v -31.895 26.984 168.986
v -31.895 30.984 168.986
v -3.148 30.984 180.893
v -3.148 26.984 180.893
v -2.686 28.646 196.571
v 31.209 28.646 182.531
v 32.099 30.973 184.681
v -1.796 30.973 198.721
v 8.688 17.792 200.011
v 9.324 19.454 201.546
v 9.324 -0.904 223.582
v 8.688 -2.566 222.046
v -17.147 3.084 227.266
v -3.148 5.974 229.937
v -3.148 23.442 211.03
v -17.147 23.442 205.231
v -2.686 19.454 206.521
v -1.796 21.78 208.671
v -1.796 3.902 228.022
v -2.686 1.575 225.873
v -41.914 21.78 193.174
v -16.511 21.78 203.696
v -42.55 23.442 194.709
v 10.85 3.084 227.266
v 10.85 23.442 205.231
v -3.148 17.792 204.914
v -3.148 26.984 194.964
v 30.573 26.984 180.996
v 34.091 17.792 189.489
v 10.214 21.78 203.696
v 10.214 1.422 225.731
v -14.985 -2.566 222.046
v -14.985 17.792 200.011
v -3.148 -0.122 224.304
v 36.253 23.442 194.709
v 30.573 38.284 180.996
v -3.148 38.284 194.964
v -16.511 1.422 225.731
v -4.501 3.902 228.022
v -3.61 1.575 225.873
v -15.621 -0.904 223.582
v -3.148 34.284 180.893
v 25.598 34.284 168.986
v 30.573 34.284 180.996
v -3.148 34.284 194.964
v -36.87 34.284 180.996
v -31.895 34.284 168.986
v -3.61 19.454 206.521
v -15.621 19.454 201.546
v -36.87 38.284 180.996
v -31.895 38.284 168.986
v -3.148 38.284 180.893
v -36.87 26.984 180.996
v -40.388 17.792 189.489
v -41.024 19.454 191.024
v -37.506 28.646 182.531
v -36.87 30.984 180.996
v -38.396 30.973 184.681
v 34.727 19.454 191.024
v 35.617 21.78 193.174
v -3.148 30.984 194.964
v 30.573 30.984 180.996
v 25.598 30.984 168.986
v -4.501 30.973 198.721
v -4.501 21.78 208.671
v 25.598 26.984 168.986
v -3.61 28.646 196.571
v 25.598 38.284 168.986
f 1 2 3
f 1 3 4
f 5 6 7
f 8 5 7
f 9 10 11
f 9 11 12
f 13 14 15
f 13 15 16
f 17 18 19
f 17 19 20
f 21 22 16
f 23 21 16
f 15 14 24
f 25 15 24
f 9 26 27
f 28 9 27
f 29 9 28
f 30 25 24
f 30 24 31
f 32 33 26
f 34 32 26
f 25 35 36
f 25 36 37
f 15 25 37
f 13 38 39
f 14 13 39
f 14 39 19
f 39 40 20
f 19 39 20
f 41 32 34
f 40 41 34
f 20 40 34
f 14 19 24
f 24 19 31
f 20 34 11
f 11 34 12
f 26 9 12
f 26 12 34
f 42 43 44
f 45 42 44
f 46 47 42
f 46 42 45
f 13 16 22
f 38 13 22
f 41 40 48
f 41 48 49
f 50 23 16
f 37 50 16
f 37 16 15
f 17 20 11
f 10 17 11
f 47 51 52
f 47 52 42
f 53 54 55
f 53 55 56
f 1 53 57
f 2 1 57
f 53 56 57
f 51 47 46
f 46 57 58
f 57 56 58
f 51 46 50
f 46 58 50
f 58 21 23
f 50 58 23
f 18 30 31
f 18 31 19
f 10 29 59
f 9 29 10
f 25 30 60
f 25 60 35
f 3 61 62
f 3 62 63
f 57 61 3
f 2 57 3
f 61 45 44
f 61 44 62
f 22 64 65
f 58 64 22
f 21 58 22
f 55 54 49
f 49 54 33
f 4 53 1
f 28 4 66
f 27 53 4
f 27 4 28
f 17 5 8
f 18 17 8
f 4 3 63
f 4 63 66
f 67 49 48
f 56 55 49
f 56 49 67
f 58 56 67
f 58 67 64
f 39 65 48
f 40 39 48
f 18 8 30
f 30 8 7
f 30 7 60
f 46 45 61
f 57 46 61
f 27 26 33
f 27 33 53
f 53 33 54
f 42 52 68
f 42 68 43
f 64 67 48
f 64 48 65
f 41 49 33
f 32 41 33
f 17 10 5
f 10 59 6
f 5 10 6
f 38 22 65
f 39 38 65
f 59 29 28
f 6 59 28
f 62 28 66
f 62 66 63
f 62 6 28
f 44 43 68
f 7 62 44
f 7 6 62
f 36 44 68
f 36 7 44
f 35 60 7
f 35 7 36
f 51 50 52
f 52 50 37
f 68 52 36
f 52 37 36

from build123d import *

# Parameters (mm, degrees)
SKETCH1_W                = 214.089522673
SKETCH1_H                = 271.033566845
BOSS_EXTRUDE1_DEPTH      = 10
SKETCH3_W                = 107.044761337
SKETCH3_H                = 271.033566845
CUT_EXTRUDE1_DEPTH       = 252.253590179
CUT_EXTRUDE2_DEPTH       = 249.55642867
BOSS_EXTRUDE3_DEPTH      = 40
CUT_EXTRUDE3_START       = -165.689856025
CUT_EXTRUDE3_DEPTH       = 205.862728092
CUT_EXTRUDE4_DEPTH       = 250.960593361
CUT_EXTRUDE5_DEPTH       = 250.960593361
CUT_EXTRUDE11_DEPTH      = 252.67545035
SKETCH26_W               = 104.148686
SKETCH26_H               = 11.3
BOSS_EXTRUDE7_DEPTH      = 45
CUT_EXTRUDE12_DEPTH      = 250.816831154
CUT_EXTRUDE13_DEPTH      = 252.67545035
CUT_EXTRUDE14_DEPTH      = 237.436663672
BOSS_EXTRUDE8_DEPTH      = 13.546139965
BOSS_EXTRUDE9_DEPTH      = 30
CUT_EXTRUDE16_DEPTH      = 184.540545695
CUT_EXTRUDE17_DEPTH      = 30
CUT_EXTRUDE17_DEPTH_BACK = 30


with BuildPart() as part:
    # Sketch1 → Boss-Extrude1 (new body)
    with BuildSketch(Plane(origin=(0, 0, 0), x_dir=(1, 0, 0), z_dir=(0, 1, 0))):
        with Locations((-3.148375333, -90.062114546)):
            Rectangle(SKETCH1_W, SKETCH1_H)
    extrude(amount=BOSS_EXTRUDE1_DEPTH)

    # Sketch3 → Cut-Extrude1 (cut, through all)
    with BuildSketch(Plane(origin=(0, 10, 0), x_dir=(1, 0, 0), z_dir=(0, 1, 0))):
        with Locations((-56.670756002, -90.062114546)):
            Rectangle(SKETCH3_W, SKETCH3_H)
    extrude(amount=-CUT_EXTRUDE1_DEPTH, mode=Mode.SUBTRACT)

    # Sketch4 → Cut-Extrude2 (cut, through all)
    with BuildSketch(Plane(origin=(0, 10, 0), x_dir=(1, 0, 0), z_dir=(0, 1, 0))):
        Polygon((103.896386003, -181.239506042), (100.834918545, -173.848469781), (9.996584241, 45.454668877), (103.896386003, 45.454668877), align=None)
    extrude(amount=-CUT_EXTRUDE2_DEPTH, mode=Mode.SUBTRACT)

    # Sketch6 → Boss-Extrude3 (add, along a direction that is not the sketch's normal)
    with BuildSketch(Plane(origin=(0, 10, 0), x_dir=(1, 0, 0), z_dir=(0, 1, 0))):
        Polygon((99.572063218, -170.799667324), (103.896386003, -181.239506042), (-3.148375333, -225.578897968), (-3.148375333, -213.347866105), align=None)
    extrude(amount=BOSS_EXTRUDE3_DEPTH, dir=(-0.2705980500730979, 0.7071067811865489, -0.6532814824381872))

    # Cut-Extrude3: read off the stored shape, not the designer's step
    # Cut-Extrude3 outline → Cut-Extrude3 (cut)
    with BuildSketch(Plane(origin=(0, 0, 0), x_dir=(1, 0, 0), z_dir=(0, 0.6785983445458481, -0.7345095552677544)).offset(CUT_EXTRUDE3_START)):
        Polygon((-3.148375333, -165), (-3.148375333, -152.122604304), (-13.972297336, -155.165042499), (-15, -155.45391393), (-15, -165), align=None)
    extrude(amount=CUT_EXTRUDE3_DEPTH, mode=Mode.SUBTRACT)

    # Sketch8 → Cut-Extrude4 (cut, through all)
    with BuildSketch(Plane(origin=(0, 10, 0), x_dir=(1, 0, 0), z_dir=(0, 1, 0))):
        Polygon((-3.148375333, -225.578897968), (103.896386003, -181.239506042), (103.896386003, -225.578897968), align=None)
    extrude(amount=-CUT_EXTRUDE4_DEPTH, mode=Mode.SUBTRACT)

    # Sketch9 → Cut-Extrude5 (cut, through all)
    with BuildSketch(Plane(origin=(0, 10, 0), x_dir=(1, 0, 0), z_dir=(0, 1, 0))):
        Polygon((-3.148375333, -213.347866105), (99.572063218, -170.799667324), (9.996584241, 45.454668877), (-3.148375333, 45.454668877), align=None)
    extrude(amount=-CUT_EXTRUDE5_DEPTH, mode=Mode.SUBTRACT)

    # Sketch25 → Cut-Extrude11 (cut, through all)
    with BuildSketch(Plane(origin=(24.603270673, 0, -10.191008392), x_dir=(-0.38268343236508967, 0, -0.9238795325112868), z_dir=(0.9238795325112867, 0, -0.3826834323650896))):
        Polygon((-178.918624473, 38.284271247), (-178.918624473, 26.984271247), (-167.618624473, 38.284271247), align=None)
    extrude(amount=-CUT_EXTRUDE11_DEPTH, mode=Mode.SUBTRACT)

    # Sketch26 → Boss-Extrude7 (add)
    with BuildSketch(Plane(origin=(68.469193327, 0, 165.299255136), x_dir=(-0.9238795325112868, 0, 0.3826834323650896), z_dir=(-0.38268343236508956, 0, -0.9238795325112867))):
        with Locations((25.443954722, 32.634271247)):
            Rectangle(SKETCH26_W, SKETCH26_H)
    extrude(amount=BOSS_EXTRUDE7_DEPTH)

    # Sketch27 → Cut-Extrude12 (cut, through all)
    with BuildSketch(Plane.XZ.offset(-26.984271247)):
        Polygon((-3.148375333, 194.964223379), (-3.148375333, 146.256574366), (-20.36912979, 153.389644416), align=None)
    extrude(amount=-CUT_EXTRUDE12_DEPTH, mode=Mode.SUBTRACT)

    # Sketch29 → Cut-Extrude13 (cut, through all)
    with BuildSketch(Plane(origin=(24.603270673, 0, -10.191008392), x_dir=(-0.38268343236508967, 0, -0.9238795325112868), z_dir=(0.9238795325112867, 0, -0.3826834323650896))):
        Polygon((-188.111012628, 17.791883092), (-189.772713564, 19.453584028), (-180.580325409, 28.645972183), (-182.906923537, 30.972570312), (-192.099311693, 21.780182156), (-193.761012628, 23.441883092), (-207.20289572, 10), (-207.20289572, 0), (-195.90289572, 0), (-195.90289572, 10), align=None)
    extrude(amount=-CUT_EXTRUDE13_DEPTH, mode=Mode.SUBTRACT)

    # Sketch31 → Cut-Extrude14 (cut, through all)
    with BuildSketch(Plane(origin=(24.603270673, 0, -10.191008392), x_dir=(-0.38268343236508967, 0, -0.9238795325112868), z_dir=(0.9238795325112867, 0, -0.3826834323650896))):
        Polygon((-133.918624473, 38.284271247), (-165.918624473, 38.284271247), (-165.918624473, 34.284271247), (-178.918624473, 34.284271247), (-178.918624473, 30.984271247), (-165.918624473, 30.984271247), (-165.918624473, 26.984271247), (-133.918624473, 26.984271247), align=None)
    extrude(amount=-CUT_EXTRUDE14_DEPTH, mode=Mode.SUBTRACT)

    # Sketch32 → Boss-Extrude8 (add, along a direction that is not the sketch's normal)
    with BuildSketch(Plane(origin=(29.071379893, -75.967176613, 70.184519615), x_dir=(-0.9626924198811577, -0.19875685341551308, 0.18362738881693294), z_dir=(0.27059805007309423, -0.7071067811865585, 0.6532814824381782))):
        Polygon((33.468379475, -163.963292106), (32.988537984, -163.822749787), (32.063683338, -166.980401064), (33.468379475, -167.391827037), align=None)
    extrude(amount=BOSS_EXTRUDE8_DEPTH, dir=(0, -0.6785983445458523, 0.7345095552677506))

    # Sketch33 → Boss-Extrude9 (add, along a direction that is not the sketch's normal)
    with BuildSketch(Plane(origin=(32.589154544, -85.159564768, 78.677178887), x_dir=(-0.962692419881157, -0.19875685341551325, 0.1836273888169371), z_dir=(0.2705980500730972, -0.7071067811865508, 0.6532814824381854))):
        Polygon((36.642638275, -164.893010983), (24.166759505, -161.238910693), (24.827308404, -158.983655684), (37.122479766, -162.584828001), (37.122479766, -170.910813534), (22.58135596, -166.651816978), (23.241904859, -164.39656197), (35.717783628, -168.05066226), align=None)
    extrude(amount=BOSS_EXTRUDE9_DEPTH, dir=(0, -0.6785983445458483, 0.7345095552677544))

    # Sketch35 → Cut-Extrude16 (cut, through all)
    with BuildSketch(Plane(origin=(39.397813434, 102.95144786, 95.11473552), x_dir=(-0.9626924198811563, 0.19875685341551394, 0.18362738881693996), z_dir=(-0.2705980500730996, -0.7071067811865461, -0.6532814824381894))):
        Polygon((31.899825803, -164.836570859), (46.839732684, -164.836570859), (46.839732684, -169.212368274), (44.194997165, -168.437743175), align=None)
    extrude(amount=-CUT_EXTRUDE16_DEPTH, mode=Mode.SUBTRACT)

    # Sketch37 → Cut-Extrude17 (cut, two sides: drawn at the far end of the back side and taken through both)
    with BuildSketch(Plane(origin=(68.469193327, 0, 165.299255136), x_dir=(-0.9238795325112868, 0, 0.3826834323650897), z_dir=(-0.38268343236508967, 0, -0.9238795325112867)).offset(-CUT_EXTRUDE17_DEPTH_BACK)):
        Polygon((41.018297722, 30.984271247), (41.018297722, 53.15222912), (-28.644246397, 53.15222912), (-28.644246397, 4.37720767), (41.018297722, 4.37720767), align=None)
    extrude(amount=CUT_EXTRUDE17_DEPTH + CUT_EXTRUDE17_DEPTH_BACK, mode=Mode.SUBTRACT)

    # Mirror2: part across plane


with BuildPart() as part_1:
    add(part.part)
    add(part.part.mirror(Plane(origin=(-3.148375333, 0, 225.578897968), x_dir=(0, 0, 1), z_dir=(1, 0, 0))))


solid = part_1.part
